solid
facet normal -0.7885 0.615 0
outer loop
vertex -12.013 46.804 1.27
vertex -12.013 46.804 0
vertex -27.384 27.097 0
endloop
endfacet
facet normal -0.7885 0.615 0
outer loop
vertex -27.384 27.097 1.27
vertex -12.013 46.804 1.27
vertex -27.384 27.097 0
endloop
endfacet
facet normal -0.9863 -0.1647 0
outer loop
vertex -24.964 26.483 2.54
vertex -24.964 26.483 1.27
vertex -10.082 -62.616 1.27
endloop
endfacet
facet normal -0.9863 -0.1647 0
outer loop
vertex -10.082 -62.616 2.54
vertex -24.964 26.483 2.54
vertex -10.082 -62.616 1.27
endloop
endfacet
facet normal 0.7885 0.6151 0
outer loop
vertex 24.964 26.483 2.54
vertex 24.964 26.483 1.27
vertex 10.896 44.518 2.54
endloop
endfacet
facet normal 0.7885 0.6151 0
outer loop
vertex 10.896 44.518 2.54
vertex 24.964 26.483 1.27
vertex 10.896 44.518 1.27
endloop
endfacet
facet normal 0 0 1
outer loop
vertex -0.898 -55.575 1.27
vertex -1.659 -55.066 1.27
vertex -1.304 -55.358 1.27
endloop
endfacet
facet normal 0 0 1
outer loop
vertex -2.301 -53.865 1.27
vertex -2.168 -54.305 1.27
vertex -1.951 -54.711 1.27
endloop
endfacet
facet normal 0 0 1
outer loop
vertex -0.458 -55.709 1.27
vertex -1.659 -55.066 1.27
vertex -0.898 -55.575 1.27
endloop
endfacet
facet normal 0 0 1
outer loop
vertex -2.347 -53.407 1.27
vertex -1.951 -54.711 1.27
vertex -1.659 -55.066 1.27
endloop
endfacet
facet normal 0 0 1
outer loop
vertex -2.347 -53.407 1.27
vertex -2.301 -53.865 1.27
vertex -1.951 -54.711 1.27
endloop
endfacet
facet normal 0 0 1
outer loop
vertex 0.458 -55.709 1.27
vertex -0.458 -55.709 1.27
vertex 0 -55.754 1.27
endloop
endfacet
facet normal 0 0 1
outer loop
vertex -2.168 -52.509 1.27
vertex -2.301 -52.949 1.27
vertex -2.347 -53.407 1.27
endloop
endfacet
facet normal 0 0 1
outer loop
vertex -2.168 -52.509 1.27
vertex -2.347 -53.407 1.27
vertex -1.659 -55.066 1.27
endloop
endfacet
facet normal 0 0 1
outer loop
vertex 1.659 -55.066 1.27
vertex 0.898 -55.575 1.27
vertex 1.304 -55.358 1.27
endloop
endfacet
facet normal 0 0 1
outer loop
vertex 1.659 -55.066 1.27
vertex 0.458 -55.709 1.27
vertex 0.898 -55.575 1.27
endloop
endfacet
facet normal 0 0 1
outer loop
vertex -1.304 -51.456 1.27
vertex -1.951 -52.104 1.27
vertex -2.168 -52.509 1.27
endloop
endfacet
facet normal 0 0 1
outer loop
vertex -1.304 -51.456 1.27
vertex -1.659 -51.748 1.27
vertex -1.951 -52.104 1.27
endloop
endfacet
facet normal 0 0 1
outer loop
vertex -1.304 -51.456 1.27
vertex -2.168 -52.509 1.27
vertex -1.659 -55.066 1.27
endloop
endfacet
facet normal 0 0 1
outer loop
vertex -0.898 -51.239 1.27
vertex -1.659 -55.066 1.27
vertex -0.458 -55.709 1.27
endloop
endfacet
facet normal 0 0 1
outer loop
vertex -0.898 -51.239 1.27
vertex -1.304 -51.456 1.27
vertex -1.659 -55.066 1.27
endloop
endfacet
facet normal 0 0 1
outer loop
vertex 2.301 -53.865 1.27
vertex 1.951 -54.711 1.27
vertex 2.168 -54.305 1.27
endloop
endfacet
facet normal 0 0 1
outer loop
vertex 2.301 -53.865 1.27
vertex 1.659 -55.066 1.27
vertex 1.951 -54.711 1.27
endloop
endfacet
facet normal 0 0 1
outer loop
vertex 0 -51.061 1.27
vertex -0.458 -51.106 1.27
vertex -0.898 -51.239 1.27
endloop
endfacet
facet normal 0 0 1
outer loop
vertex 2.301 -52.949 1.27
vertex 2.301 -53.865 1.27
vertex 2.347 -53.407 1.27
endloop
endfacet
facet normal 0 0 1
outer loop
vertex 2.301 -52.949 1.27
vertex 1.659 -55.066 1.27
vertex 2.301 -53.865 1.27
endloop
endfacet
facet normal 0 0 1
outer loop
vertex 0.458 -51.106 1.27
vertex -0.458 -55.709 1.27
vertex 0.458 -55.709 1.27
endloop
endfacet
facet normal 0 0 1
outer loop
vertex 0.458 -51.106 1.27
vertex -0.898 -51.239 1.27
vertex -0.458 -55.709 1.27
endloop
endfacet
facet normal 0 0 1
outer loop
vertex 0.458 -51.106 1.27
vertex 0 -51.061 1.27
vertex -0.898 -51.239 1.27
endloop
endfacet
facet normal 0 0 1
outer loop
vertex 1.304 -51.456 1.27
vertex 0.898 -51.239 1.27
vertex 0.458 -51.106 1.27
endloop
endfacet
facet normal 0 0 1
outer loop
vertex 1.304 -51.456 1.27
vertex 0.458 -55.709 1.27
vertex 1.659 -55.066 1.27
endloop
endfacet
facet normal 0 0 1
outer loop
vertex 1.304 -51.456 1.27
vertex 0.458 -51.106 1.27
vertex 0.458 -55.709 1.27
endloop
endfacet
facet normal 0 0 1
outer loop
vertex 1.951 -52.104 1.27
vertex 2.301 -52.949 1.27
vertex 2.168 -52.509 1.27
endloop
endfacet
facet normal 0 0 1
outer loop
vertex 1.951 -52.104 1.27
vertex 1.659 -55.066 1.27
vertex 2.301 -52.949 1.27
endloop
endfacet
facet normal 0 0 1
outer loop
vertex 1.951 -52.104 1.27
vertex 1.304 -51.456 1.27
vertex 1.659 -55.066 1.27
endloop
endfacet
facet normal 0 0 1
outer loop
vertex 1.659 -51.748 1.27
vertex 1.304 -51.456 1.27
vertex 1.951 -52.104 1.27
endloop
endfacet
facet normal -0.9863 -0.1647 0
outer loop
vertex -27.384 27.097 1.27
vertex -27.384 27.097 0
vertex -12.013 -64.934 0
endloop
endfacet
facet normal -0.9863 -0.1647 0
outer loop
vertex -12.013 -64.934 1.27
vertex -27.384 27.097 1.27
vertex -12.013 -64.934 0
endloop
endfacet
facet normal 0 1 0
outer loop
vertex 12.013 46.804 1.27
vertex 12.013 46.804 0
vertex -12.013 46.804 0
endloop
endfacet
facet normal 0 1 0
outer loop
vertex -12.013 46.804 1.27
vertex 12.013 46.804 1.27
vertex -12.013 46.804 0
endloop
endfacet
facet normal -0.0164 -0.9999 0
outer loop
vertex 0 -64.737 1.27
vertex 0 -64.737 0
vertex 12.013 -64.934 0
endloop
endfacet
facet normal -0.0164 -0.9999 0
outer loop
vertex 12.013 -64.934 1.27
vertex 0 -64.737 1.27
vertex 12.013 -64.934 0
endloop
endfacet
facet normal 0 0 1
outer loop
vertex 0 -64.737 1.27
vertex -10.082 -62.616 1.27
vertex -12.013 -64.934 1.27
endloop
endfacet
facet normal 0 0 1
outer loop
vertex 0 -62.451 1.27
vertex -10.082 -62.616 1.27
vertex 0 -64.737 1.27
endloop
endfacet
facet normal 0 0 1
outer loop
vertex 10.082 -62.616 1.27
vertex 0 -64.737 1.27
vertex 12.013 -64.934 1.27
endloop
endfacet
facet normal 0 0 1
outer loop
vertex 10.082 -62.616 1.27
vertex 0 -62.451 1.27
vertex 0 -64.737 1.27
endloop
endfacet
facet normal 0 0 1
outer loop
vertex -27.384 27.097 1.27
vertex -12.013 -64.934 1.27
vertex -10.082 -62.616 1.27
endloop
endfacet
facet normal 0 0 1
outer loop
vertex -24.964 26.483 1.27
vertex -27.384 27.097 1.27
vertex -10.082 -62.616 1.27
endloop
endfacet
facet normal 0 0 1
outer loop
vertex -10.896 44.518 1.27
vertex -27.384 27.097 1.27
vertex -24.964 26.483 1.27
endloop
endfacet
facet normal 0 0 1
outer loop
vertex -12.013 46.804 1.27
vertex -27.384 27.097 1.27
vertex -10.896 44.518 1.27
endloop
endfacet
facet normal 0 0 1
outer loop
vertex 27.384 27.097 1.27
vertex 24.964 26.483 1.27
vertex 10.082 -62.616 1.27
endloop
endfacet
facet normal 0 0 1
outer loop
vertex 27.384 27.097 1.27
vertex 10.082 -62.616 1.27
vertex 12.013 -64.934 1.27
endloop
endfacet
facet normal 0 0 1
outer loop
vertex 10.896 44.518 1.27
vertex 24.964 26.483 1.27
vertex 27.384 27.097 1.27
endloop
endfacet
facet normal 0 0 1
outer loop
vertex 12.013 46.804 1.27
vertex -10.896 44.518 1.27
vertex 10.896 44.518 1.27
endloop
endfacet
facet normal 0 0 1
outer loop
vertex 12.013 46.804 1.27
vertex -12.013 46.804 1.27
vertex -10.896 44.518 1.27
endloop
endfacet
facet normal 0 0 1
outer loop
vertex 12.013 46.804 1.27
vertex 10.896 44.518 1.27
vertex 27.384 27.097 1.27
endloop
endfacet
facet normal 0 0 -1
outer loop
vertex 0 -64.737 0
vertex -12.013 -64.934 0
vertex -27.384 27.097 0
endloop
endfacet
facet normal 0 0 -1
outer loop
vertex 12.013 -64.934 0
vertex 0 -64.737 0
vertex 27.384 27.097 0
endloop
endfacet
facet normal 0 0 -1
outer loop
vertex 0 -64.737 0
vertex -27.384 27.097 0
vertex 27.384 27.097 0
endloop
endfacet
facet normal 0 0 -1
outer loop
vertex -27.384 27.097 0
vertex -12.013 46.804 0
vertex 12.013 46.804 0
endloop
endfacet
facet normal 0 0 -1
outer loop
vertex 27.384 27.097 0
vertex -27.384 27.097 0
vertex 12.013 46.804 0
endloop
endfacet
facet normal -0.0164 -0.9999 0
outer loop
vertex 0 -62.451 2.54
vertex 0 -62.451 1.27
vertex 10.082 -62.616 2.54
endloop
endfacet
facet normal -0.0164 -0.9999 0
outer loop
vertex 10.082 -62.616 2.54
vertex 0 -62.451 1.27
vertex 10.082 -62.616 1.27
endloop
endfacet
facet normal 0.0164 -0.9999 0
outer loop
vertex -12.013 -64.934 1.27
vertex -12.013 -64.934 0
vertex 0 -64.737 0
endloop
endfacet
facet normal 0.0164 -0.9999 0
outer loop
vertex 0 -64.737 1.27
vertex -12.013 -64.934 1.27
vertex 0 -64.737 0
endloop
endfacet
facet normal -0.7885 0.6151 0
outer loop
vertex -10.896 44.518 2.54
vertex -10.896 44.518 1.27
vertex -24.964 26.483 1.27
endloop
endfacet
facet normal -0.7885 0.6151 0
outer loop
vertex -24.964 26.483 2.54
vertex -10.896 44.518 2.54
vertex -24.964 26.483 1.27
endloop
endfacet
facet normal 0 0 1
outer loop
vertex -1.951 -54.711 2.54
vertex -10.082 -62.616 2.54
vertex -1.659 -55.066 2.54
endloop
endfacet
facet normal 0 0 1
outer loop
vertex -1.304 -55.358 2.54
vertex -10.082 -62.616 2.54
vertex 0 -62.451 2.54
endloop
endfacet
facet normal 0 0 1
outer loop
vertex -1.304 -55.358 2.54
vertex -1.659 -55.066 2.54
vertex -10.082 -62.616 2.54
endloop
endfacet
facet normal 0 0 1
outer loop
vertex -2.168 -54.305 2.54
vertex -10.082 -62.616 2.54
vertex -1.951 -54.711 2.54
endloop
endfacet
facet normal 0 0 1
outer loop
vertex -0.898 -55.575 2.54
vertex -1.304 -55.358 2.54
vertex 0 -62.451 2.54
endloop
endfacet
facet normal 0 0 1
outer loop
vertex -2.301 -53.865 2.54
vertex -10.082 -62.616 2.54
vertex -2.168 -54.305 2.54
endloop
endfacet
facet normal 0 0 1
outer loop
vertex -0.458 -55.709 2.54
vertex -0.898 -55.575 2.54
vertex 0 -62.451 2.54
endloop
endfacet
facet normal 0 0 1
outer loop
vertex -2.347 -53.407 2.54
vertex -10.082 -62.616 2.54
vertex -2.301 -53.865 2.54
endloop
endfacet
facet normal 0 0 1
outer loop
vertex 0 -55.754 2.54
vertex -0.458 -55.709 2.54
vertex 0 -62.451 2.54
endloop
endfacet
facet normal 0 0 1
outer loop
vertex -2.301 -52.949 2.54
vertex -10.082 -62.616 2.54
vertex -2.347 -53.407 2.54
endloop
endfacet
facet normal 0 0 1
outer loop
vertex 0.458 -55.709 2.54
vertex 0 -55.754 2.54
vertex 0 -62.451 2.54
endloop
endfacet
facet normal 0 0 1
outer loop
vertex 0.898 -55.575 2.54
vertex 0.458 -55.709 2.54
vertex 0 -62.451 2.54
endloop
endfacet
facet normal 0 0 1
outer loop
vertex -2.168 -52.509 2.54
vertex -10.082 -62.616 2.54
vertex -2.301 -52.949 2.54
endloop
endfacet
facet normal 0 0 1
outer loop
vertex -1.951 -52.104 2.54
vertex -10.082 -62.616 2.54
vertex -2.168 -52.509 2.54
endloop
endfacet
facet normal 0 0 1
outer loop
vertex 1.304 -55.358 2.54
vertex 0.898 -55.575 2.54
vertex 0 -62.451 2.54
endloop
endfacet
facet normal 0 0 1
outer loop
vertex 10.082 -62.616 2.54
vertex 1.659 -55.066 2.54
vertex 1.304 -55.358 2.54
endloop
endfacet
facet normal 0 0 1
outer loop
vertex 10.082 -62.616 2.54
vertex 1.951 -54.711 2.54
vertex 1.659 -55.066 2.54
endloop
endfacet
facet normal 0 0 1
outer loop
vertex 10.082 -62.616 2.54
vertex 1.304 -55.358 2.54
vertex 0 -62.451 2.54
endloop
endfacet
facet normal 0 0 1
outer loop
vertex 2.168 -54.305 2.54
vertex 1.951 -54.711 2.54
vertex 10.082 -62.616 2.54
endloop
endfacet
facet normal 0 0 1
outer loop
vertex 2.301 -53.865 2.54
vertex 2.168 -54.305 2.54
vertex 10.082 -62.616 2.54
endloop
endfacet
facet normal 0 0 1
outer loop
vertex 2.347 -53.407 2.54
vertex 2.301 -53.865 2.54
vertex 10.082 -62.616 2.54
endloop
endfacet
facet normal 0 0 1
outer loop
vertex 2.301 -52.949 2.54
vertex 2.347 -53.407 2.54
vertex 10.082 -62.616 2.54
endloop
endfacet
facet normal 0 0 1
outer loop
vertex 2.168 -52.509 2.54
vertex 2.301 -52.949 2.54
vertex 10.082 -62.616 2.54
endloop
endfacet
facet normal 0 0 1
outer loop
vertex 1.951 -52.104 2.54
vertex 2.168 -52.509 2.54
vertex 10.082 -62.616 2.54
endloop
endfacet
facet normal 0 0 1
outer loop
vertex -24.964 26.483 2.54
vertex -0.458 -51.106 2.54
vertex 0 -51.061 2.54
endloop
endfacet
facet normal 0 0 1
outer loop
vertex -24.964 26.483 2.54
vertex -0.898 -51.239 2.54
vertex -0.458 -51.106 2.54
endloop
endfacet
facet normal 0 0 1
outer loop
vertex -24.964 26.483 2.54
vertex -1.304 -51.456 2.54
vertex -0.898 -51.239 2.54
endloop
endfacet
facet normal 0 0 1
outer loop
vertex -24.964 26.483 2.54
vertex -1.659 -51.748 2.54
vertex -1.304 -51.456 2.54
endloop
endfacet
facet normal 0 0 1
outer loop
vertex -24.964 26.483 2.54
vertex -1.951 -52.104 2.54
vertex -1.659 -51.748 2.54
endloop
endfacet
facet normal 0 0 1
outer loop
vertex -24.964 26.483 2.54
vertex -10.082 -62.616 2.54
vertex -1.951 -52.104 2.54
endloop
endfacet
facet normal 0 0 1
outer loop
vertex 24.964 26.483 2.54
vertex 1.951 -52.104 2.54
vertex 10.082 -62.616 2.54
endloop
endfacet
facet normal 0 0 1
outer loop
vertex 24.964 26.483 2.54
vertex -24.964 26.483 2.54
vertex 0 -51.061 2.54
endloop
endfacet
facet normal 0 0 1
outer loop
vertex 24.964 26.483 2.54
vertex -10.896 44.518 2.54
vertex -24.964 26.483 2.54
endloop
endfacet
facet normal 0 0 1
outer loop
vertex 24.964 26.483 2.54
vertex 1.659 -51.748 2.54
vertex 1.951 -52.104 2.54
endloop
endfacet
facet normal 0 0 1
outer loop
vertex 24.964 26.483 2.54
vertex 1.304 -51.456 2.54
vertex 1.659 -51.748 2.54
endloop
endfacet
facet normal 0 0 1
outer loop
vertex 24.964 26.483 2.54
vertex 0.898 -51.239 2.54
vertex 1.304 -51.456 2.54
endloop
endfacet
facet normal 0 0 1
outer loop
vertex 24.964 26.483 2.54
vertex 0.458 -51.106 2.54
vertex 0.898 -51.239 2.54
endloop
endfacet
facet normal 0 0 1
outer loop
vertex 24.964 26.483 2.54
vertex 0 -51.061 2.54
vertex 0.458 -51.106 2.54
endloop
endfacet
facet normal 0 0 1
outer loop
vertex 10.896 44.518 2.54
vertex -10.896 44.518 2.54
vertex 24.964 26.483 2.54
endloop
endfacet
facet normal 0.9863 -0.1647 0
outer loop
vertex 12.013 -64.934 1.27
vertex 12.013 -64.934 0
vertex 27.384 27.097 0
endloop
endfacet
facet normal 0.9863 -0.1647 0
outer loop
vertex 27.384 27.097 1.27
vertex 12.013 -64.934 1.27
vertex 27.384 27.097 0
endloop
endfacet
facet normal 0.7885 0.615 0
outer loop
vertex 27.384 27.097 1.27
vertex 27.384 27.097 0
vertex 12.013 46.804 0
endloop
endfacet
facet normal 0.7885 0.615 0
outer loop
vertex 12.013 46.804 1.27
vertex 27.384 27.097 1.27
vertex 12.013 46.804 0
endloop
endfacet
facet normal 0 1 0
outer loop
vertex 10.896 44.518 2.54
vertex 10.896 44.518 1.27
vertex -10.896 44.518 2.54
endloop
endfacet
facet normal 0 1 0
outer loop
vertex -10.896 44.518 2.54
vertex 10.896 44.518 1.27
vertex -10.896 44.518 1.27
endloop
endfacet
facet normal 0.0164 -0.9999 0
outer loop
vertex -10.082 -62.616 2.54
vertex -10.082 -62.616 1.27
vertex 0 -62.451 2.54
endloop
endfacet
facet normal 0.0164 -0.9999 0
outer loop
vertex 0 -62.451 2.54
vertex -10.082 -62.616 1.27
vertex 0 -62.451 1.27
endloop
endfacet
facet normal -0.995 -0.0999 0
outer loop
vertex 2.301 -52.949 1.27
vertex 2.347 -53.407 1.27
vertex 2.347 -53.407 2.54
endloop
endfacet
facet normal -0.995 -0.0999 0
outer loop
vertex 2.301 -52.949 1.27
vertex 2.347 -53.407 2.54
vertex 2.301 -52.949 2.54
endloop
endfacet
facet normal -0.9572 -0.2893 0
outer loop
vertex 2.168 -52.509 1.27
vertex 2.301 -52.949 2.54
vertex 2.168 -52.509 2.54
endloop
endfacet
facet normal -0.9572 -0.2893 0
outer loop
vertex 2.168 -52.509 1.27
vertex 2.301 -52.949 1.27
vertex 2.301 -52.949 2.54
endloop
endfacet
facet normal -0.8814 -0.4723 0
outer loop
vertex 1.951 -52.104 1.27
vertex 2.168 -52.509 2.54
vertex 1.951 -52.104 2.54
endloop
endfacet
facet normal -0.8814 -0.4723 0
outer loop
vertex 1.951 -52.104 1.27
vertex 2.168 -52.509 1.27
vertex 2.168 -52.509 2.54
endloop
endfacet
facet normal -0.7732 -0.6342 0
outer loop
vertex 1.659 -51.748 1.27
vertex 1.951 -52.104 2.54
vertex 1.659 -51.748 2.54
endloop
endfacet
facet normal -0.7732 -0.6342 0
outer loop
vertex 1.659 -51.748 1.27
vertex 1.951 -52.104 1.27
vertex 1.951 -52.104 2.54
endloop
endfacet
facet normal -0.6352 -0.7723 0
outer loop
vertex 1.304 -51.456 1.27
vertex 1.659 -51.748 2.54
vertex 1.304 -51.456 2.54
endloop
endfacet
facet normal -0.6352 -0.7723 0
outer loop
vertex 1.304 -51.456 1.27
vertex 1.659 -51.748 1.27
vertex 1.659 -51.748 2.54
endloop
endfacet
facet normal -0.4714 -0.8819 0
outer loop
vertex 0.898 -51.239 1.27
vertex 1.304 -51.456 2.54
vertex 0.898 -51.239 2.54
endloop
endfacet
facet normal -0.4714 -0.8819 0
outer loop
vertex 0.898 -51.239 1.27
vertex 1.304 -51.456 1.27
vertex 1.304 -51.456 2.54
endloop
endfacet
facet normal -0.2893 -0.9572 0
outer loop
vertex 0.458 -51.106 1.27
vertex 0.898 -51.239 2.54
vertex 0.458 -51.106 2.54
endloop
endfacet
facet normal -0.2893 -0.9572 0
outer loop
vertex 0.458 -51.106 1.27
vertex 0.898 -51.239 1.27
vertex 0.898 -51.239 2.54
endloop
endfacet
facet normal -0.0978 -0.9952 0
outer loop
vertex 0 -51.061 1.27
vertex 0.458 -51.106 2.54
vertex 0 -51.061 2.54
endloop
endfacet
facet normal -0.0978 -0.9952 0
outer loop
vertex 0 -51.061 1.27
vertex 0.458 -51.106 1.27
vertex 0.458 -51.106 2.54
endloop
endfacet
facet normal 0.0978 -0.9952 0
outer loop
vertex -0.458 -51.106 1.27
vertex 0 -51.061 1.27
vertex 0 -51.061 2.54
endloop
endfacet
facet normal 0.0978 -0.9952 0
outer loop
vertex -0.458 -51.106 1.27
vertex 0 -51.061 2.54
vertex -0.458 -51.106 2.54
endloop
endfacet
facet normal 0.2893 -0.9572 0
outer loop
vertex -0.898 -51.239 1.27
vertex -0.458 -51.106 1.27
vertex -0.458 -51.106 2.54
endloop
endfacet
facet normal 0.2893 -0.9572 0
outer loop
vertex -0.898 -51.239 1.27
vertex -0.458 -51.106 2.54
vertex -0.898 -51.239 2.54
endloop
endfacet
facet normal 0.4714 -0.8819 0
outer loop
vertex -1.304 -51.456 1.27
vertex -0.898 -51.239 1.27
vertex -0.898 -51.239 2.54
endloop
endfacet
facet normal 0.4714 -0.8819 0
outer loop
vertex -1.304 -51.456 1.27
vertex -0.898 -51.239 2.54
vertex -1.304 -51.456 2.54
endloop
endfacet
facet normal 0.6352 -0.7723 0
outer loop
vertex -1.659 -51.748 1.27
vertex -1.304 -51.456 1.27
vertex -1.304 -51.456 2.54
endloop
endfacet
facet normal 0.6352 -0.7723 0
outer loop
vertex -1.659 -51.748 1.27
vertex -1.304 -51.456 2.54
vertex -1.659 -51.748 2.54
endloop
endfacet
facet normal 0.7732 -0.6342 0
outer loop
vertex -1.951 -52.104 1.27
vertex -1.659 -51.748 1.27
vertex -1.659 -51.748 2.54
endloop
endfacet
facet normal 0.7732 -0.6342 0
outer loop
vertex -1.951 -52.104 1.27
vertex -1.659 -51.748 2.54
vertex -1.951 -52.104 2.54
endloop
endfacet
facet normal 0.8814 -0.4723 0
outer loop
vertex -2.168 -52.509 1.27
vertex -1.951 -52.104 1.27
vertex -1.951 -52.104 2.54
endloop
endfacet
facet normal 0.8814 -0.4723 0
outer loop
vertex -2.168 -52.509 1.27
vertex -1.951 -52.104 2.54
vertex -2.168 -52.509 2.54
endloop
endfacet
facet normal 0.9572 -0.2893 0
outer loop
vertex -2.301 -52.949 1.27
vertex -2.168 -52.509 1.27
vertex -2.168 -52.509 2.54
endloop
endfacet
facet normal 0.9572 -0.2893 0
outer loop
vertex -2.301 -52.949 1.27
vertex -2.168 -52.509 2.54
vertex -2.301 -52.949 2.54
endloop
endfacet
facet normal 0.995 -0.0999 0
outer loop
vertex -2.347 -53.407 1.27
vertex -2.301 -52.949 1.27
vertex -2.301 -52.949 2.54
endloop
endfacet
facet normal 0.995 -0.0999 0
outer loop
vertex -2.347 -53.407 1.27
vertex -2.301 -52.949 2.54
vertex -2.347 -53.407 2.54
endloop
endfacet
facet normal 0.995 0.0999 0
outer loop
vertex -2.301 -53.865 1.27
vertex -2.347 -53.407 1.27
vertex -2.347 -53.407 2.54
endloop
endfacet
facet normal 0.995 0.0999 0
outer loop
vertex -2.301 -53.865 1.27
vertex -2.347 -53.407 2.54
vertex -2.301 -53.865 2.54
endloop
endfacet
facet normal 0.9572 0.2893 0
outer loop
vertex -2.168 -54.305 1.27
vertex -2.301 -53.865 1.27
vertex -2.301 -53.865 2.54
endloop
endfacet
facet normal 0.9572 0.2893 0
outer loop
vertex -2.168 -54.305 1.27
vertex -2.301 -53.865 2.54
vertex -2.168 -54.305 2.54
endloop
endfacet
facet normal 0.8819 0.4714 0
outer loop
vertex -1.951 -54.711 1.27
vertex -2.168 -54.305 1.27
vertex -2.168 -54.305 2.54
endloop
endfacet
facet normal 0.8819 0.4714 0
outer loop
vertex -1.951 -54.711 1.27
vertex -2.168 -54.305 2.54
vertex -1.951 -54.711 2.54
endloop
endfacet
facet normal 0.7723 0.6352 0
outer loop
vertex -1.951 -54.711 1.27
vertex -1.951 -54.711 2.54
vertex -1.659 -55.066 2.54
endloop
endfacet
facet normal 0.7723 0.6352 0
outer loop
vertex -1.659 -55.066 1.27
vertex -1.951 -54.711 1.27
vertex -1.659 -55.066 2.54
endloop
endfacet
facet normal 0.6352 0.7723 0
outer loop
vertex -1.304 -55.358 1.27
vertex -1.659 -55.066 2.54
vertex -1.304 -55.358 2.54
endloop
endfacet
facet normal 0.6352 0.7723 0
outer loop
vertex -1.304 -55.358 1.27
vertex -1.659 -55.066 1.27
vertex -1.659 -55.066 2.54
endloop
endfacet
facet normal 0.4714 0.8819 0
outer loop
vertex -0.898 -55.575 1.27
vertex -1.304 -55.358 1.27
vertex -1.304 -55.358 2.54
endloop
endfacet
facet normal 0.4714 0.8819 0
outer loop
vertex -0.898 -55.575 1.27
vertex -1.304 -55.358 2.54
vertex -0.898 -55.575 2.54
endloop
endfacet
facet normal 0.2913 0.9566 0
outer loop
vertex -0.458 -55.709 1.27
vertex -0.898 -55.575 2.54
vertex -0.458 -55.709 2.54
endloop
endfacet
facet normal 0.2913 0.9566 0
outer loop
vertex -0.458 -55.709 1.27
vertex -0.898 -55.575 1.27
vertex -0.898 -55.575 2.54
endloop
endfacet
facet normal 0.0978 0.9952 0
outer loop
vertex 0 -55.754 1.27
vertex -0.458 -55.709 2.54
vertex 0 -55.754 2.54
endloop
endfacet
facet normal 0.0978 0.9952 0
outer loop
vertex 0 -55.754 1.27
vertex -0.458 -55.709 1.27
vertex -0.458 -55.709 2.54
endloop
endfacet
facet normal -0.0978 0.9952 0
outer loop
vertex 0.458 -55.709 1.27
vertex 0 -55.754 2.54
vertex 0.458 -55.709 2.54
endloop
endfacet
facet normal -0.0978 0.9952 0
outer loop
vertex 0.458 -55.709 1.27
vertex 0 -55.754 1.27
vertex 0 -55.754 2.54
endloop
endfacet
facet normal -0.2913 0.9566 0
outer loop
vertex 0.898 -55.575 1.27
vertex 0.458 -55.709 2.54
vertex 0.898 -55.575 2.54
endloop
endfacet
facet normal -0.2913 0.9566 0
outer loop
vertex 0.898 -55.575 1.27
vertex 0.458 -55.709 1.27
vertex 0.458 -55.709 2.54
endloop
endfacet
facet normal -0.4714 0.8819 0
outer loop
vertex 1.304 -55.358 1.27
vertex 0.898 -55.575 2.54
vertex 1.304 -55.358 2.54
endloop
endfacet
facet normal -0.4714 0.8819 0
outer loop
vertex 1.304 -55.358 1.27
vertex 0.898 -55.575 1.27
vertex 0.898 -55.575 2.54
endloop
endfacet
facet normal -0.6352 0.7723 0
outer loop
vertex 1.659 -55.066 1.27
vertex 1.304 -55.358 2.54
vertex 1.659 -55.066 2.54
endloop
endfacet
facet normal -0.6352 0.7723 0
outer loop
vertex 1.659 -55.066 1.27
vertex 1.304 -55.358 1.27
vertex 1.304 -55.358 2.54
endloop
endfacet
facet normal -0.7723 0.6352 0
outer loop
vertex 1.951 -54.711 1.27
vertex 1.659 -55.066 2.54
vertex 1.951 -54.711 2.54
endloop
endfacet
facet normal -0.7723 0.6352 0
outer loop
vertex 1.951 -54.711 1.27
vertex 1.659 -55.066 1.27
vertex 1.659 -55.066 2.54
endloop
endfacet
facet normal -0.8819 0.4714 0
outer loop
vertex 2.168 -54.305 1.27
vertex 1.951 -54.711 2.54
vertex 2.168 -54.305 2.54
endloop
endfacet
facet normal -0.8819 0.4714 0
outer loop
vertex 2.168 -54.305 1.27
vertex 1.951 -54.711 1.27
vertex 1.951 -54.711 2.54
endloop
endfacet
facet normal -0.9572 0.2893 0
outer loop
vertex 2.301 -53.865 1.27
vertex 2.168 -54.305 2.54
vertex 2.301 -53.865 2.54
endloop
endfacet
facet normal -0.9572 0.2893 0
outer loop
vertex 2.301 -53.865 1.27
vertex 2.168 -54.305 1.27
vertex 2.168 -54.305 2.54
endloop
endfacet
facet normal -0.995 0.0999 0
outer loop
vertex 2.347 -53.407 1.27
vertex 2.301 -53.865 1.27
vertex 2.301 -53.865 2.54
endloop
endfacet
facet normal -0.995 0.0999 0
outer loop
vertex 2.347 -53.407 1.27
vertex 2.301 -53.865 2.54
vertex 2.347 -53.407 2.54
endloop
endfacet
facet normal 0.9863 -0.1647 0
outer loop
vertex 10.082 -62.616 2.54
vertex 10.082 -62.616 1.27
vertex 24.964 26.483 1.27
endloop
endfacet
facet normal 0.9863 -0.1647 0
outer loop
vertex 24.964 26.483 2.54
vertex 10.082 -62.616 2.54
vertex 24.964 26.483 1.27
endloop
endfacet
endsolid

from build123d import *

# Parameters (mm, degrees)
F1_DEPTH = 1.27
F2_R     = 2.346552
F3_DEPTH = 2.54


with BuildPart() as f1:
    # F0 (on Top) → F1 (new body)
    with BuildSketch(Plane.XY):
        Polygon((12.012586, 46.803898), (0, 46.803898), (-12.012586, 46.803898), (-27.383965, 27.097), (-12.012586, -64.934207), (0, -64.73728), (12.012586, -64.934207), (27.383965, 27.097), align=None)
    extrude(amount=F1_DEPTH)

    # F2 (on face) → F3 (join)
    with BuildSketch(Plane.XY):
        Polygon((0, -62.450973), (10.082072, -62.616252), (24.963741, 26.482971), (10.896499, 44.517897), (0, 44.517897), (-10.896499, 44.517897), (-24.963741, 26.482971), (-10.082072, -62.616252), align=None)
        Polygon((20.66112, 25.391363), (6.650048, -58.495444), (0, -58.386427), (-6.650048, -58.495444), (-20.66112, 25.391363), (-8.912344, 40.453898), (0, 40.453898), (8.912344, 40.453898), align=None, mode=Mode.SUBTRACT)
        Polygon((0, -58.386427), (6.650048, -58.495444), (20.66112, 25.391363), (8.912344, 40.453898), (0, 40.453898), (-8.912344, 40.453898), (-20.66112, 25.391363), (-6.650048, -58.495444), align=None)
        with Locations((0, -53.407203)):
            Circle(F2_R, mode=Mode.SUBTRACT)
    extrude(amount=F3_DEPTH)


solid = f1.part
